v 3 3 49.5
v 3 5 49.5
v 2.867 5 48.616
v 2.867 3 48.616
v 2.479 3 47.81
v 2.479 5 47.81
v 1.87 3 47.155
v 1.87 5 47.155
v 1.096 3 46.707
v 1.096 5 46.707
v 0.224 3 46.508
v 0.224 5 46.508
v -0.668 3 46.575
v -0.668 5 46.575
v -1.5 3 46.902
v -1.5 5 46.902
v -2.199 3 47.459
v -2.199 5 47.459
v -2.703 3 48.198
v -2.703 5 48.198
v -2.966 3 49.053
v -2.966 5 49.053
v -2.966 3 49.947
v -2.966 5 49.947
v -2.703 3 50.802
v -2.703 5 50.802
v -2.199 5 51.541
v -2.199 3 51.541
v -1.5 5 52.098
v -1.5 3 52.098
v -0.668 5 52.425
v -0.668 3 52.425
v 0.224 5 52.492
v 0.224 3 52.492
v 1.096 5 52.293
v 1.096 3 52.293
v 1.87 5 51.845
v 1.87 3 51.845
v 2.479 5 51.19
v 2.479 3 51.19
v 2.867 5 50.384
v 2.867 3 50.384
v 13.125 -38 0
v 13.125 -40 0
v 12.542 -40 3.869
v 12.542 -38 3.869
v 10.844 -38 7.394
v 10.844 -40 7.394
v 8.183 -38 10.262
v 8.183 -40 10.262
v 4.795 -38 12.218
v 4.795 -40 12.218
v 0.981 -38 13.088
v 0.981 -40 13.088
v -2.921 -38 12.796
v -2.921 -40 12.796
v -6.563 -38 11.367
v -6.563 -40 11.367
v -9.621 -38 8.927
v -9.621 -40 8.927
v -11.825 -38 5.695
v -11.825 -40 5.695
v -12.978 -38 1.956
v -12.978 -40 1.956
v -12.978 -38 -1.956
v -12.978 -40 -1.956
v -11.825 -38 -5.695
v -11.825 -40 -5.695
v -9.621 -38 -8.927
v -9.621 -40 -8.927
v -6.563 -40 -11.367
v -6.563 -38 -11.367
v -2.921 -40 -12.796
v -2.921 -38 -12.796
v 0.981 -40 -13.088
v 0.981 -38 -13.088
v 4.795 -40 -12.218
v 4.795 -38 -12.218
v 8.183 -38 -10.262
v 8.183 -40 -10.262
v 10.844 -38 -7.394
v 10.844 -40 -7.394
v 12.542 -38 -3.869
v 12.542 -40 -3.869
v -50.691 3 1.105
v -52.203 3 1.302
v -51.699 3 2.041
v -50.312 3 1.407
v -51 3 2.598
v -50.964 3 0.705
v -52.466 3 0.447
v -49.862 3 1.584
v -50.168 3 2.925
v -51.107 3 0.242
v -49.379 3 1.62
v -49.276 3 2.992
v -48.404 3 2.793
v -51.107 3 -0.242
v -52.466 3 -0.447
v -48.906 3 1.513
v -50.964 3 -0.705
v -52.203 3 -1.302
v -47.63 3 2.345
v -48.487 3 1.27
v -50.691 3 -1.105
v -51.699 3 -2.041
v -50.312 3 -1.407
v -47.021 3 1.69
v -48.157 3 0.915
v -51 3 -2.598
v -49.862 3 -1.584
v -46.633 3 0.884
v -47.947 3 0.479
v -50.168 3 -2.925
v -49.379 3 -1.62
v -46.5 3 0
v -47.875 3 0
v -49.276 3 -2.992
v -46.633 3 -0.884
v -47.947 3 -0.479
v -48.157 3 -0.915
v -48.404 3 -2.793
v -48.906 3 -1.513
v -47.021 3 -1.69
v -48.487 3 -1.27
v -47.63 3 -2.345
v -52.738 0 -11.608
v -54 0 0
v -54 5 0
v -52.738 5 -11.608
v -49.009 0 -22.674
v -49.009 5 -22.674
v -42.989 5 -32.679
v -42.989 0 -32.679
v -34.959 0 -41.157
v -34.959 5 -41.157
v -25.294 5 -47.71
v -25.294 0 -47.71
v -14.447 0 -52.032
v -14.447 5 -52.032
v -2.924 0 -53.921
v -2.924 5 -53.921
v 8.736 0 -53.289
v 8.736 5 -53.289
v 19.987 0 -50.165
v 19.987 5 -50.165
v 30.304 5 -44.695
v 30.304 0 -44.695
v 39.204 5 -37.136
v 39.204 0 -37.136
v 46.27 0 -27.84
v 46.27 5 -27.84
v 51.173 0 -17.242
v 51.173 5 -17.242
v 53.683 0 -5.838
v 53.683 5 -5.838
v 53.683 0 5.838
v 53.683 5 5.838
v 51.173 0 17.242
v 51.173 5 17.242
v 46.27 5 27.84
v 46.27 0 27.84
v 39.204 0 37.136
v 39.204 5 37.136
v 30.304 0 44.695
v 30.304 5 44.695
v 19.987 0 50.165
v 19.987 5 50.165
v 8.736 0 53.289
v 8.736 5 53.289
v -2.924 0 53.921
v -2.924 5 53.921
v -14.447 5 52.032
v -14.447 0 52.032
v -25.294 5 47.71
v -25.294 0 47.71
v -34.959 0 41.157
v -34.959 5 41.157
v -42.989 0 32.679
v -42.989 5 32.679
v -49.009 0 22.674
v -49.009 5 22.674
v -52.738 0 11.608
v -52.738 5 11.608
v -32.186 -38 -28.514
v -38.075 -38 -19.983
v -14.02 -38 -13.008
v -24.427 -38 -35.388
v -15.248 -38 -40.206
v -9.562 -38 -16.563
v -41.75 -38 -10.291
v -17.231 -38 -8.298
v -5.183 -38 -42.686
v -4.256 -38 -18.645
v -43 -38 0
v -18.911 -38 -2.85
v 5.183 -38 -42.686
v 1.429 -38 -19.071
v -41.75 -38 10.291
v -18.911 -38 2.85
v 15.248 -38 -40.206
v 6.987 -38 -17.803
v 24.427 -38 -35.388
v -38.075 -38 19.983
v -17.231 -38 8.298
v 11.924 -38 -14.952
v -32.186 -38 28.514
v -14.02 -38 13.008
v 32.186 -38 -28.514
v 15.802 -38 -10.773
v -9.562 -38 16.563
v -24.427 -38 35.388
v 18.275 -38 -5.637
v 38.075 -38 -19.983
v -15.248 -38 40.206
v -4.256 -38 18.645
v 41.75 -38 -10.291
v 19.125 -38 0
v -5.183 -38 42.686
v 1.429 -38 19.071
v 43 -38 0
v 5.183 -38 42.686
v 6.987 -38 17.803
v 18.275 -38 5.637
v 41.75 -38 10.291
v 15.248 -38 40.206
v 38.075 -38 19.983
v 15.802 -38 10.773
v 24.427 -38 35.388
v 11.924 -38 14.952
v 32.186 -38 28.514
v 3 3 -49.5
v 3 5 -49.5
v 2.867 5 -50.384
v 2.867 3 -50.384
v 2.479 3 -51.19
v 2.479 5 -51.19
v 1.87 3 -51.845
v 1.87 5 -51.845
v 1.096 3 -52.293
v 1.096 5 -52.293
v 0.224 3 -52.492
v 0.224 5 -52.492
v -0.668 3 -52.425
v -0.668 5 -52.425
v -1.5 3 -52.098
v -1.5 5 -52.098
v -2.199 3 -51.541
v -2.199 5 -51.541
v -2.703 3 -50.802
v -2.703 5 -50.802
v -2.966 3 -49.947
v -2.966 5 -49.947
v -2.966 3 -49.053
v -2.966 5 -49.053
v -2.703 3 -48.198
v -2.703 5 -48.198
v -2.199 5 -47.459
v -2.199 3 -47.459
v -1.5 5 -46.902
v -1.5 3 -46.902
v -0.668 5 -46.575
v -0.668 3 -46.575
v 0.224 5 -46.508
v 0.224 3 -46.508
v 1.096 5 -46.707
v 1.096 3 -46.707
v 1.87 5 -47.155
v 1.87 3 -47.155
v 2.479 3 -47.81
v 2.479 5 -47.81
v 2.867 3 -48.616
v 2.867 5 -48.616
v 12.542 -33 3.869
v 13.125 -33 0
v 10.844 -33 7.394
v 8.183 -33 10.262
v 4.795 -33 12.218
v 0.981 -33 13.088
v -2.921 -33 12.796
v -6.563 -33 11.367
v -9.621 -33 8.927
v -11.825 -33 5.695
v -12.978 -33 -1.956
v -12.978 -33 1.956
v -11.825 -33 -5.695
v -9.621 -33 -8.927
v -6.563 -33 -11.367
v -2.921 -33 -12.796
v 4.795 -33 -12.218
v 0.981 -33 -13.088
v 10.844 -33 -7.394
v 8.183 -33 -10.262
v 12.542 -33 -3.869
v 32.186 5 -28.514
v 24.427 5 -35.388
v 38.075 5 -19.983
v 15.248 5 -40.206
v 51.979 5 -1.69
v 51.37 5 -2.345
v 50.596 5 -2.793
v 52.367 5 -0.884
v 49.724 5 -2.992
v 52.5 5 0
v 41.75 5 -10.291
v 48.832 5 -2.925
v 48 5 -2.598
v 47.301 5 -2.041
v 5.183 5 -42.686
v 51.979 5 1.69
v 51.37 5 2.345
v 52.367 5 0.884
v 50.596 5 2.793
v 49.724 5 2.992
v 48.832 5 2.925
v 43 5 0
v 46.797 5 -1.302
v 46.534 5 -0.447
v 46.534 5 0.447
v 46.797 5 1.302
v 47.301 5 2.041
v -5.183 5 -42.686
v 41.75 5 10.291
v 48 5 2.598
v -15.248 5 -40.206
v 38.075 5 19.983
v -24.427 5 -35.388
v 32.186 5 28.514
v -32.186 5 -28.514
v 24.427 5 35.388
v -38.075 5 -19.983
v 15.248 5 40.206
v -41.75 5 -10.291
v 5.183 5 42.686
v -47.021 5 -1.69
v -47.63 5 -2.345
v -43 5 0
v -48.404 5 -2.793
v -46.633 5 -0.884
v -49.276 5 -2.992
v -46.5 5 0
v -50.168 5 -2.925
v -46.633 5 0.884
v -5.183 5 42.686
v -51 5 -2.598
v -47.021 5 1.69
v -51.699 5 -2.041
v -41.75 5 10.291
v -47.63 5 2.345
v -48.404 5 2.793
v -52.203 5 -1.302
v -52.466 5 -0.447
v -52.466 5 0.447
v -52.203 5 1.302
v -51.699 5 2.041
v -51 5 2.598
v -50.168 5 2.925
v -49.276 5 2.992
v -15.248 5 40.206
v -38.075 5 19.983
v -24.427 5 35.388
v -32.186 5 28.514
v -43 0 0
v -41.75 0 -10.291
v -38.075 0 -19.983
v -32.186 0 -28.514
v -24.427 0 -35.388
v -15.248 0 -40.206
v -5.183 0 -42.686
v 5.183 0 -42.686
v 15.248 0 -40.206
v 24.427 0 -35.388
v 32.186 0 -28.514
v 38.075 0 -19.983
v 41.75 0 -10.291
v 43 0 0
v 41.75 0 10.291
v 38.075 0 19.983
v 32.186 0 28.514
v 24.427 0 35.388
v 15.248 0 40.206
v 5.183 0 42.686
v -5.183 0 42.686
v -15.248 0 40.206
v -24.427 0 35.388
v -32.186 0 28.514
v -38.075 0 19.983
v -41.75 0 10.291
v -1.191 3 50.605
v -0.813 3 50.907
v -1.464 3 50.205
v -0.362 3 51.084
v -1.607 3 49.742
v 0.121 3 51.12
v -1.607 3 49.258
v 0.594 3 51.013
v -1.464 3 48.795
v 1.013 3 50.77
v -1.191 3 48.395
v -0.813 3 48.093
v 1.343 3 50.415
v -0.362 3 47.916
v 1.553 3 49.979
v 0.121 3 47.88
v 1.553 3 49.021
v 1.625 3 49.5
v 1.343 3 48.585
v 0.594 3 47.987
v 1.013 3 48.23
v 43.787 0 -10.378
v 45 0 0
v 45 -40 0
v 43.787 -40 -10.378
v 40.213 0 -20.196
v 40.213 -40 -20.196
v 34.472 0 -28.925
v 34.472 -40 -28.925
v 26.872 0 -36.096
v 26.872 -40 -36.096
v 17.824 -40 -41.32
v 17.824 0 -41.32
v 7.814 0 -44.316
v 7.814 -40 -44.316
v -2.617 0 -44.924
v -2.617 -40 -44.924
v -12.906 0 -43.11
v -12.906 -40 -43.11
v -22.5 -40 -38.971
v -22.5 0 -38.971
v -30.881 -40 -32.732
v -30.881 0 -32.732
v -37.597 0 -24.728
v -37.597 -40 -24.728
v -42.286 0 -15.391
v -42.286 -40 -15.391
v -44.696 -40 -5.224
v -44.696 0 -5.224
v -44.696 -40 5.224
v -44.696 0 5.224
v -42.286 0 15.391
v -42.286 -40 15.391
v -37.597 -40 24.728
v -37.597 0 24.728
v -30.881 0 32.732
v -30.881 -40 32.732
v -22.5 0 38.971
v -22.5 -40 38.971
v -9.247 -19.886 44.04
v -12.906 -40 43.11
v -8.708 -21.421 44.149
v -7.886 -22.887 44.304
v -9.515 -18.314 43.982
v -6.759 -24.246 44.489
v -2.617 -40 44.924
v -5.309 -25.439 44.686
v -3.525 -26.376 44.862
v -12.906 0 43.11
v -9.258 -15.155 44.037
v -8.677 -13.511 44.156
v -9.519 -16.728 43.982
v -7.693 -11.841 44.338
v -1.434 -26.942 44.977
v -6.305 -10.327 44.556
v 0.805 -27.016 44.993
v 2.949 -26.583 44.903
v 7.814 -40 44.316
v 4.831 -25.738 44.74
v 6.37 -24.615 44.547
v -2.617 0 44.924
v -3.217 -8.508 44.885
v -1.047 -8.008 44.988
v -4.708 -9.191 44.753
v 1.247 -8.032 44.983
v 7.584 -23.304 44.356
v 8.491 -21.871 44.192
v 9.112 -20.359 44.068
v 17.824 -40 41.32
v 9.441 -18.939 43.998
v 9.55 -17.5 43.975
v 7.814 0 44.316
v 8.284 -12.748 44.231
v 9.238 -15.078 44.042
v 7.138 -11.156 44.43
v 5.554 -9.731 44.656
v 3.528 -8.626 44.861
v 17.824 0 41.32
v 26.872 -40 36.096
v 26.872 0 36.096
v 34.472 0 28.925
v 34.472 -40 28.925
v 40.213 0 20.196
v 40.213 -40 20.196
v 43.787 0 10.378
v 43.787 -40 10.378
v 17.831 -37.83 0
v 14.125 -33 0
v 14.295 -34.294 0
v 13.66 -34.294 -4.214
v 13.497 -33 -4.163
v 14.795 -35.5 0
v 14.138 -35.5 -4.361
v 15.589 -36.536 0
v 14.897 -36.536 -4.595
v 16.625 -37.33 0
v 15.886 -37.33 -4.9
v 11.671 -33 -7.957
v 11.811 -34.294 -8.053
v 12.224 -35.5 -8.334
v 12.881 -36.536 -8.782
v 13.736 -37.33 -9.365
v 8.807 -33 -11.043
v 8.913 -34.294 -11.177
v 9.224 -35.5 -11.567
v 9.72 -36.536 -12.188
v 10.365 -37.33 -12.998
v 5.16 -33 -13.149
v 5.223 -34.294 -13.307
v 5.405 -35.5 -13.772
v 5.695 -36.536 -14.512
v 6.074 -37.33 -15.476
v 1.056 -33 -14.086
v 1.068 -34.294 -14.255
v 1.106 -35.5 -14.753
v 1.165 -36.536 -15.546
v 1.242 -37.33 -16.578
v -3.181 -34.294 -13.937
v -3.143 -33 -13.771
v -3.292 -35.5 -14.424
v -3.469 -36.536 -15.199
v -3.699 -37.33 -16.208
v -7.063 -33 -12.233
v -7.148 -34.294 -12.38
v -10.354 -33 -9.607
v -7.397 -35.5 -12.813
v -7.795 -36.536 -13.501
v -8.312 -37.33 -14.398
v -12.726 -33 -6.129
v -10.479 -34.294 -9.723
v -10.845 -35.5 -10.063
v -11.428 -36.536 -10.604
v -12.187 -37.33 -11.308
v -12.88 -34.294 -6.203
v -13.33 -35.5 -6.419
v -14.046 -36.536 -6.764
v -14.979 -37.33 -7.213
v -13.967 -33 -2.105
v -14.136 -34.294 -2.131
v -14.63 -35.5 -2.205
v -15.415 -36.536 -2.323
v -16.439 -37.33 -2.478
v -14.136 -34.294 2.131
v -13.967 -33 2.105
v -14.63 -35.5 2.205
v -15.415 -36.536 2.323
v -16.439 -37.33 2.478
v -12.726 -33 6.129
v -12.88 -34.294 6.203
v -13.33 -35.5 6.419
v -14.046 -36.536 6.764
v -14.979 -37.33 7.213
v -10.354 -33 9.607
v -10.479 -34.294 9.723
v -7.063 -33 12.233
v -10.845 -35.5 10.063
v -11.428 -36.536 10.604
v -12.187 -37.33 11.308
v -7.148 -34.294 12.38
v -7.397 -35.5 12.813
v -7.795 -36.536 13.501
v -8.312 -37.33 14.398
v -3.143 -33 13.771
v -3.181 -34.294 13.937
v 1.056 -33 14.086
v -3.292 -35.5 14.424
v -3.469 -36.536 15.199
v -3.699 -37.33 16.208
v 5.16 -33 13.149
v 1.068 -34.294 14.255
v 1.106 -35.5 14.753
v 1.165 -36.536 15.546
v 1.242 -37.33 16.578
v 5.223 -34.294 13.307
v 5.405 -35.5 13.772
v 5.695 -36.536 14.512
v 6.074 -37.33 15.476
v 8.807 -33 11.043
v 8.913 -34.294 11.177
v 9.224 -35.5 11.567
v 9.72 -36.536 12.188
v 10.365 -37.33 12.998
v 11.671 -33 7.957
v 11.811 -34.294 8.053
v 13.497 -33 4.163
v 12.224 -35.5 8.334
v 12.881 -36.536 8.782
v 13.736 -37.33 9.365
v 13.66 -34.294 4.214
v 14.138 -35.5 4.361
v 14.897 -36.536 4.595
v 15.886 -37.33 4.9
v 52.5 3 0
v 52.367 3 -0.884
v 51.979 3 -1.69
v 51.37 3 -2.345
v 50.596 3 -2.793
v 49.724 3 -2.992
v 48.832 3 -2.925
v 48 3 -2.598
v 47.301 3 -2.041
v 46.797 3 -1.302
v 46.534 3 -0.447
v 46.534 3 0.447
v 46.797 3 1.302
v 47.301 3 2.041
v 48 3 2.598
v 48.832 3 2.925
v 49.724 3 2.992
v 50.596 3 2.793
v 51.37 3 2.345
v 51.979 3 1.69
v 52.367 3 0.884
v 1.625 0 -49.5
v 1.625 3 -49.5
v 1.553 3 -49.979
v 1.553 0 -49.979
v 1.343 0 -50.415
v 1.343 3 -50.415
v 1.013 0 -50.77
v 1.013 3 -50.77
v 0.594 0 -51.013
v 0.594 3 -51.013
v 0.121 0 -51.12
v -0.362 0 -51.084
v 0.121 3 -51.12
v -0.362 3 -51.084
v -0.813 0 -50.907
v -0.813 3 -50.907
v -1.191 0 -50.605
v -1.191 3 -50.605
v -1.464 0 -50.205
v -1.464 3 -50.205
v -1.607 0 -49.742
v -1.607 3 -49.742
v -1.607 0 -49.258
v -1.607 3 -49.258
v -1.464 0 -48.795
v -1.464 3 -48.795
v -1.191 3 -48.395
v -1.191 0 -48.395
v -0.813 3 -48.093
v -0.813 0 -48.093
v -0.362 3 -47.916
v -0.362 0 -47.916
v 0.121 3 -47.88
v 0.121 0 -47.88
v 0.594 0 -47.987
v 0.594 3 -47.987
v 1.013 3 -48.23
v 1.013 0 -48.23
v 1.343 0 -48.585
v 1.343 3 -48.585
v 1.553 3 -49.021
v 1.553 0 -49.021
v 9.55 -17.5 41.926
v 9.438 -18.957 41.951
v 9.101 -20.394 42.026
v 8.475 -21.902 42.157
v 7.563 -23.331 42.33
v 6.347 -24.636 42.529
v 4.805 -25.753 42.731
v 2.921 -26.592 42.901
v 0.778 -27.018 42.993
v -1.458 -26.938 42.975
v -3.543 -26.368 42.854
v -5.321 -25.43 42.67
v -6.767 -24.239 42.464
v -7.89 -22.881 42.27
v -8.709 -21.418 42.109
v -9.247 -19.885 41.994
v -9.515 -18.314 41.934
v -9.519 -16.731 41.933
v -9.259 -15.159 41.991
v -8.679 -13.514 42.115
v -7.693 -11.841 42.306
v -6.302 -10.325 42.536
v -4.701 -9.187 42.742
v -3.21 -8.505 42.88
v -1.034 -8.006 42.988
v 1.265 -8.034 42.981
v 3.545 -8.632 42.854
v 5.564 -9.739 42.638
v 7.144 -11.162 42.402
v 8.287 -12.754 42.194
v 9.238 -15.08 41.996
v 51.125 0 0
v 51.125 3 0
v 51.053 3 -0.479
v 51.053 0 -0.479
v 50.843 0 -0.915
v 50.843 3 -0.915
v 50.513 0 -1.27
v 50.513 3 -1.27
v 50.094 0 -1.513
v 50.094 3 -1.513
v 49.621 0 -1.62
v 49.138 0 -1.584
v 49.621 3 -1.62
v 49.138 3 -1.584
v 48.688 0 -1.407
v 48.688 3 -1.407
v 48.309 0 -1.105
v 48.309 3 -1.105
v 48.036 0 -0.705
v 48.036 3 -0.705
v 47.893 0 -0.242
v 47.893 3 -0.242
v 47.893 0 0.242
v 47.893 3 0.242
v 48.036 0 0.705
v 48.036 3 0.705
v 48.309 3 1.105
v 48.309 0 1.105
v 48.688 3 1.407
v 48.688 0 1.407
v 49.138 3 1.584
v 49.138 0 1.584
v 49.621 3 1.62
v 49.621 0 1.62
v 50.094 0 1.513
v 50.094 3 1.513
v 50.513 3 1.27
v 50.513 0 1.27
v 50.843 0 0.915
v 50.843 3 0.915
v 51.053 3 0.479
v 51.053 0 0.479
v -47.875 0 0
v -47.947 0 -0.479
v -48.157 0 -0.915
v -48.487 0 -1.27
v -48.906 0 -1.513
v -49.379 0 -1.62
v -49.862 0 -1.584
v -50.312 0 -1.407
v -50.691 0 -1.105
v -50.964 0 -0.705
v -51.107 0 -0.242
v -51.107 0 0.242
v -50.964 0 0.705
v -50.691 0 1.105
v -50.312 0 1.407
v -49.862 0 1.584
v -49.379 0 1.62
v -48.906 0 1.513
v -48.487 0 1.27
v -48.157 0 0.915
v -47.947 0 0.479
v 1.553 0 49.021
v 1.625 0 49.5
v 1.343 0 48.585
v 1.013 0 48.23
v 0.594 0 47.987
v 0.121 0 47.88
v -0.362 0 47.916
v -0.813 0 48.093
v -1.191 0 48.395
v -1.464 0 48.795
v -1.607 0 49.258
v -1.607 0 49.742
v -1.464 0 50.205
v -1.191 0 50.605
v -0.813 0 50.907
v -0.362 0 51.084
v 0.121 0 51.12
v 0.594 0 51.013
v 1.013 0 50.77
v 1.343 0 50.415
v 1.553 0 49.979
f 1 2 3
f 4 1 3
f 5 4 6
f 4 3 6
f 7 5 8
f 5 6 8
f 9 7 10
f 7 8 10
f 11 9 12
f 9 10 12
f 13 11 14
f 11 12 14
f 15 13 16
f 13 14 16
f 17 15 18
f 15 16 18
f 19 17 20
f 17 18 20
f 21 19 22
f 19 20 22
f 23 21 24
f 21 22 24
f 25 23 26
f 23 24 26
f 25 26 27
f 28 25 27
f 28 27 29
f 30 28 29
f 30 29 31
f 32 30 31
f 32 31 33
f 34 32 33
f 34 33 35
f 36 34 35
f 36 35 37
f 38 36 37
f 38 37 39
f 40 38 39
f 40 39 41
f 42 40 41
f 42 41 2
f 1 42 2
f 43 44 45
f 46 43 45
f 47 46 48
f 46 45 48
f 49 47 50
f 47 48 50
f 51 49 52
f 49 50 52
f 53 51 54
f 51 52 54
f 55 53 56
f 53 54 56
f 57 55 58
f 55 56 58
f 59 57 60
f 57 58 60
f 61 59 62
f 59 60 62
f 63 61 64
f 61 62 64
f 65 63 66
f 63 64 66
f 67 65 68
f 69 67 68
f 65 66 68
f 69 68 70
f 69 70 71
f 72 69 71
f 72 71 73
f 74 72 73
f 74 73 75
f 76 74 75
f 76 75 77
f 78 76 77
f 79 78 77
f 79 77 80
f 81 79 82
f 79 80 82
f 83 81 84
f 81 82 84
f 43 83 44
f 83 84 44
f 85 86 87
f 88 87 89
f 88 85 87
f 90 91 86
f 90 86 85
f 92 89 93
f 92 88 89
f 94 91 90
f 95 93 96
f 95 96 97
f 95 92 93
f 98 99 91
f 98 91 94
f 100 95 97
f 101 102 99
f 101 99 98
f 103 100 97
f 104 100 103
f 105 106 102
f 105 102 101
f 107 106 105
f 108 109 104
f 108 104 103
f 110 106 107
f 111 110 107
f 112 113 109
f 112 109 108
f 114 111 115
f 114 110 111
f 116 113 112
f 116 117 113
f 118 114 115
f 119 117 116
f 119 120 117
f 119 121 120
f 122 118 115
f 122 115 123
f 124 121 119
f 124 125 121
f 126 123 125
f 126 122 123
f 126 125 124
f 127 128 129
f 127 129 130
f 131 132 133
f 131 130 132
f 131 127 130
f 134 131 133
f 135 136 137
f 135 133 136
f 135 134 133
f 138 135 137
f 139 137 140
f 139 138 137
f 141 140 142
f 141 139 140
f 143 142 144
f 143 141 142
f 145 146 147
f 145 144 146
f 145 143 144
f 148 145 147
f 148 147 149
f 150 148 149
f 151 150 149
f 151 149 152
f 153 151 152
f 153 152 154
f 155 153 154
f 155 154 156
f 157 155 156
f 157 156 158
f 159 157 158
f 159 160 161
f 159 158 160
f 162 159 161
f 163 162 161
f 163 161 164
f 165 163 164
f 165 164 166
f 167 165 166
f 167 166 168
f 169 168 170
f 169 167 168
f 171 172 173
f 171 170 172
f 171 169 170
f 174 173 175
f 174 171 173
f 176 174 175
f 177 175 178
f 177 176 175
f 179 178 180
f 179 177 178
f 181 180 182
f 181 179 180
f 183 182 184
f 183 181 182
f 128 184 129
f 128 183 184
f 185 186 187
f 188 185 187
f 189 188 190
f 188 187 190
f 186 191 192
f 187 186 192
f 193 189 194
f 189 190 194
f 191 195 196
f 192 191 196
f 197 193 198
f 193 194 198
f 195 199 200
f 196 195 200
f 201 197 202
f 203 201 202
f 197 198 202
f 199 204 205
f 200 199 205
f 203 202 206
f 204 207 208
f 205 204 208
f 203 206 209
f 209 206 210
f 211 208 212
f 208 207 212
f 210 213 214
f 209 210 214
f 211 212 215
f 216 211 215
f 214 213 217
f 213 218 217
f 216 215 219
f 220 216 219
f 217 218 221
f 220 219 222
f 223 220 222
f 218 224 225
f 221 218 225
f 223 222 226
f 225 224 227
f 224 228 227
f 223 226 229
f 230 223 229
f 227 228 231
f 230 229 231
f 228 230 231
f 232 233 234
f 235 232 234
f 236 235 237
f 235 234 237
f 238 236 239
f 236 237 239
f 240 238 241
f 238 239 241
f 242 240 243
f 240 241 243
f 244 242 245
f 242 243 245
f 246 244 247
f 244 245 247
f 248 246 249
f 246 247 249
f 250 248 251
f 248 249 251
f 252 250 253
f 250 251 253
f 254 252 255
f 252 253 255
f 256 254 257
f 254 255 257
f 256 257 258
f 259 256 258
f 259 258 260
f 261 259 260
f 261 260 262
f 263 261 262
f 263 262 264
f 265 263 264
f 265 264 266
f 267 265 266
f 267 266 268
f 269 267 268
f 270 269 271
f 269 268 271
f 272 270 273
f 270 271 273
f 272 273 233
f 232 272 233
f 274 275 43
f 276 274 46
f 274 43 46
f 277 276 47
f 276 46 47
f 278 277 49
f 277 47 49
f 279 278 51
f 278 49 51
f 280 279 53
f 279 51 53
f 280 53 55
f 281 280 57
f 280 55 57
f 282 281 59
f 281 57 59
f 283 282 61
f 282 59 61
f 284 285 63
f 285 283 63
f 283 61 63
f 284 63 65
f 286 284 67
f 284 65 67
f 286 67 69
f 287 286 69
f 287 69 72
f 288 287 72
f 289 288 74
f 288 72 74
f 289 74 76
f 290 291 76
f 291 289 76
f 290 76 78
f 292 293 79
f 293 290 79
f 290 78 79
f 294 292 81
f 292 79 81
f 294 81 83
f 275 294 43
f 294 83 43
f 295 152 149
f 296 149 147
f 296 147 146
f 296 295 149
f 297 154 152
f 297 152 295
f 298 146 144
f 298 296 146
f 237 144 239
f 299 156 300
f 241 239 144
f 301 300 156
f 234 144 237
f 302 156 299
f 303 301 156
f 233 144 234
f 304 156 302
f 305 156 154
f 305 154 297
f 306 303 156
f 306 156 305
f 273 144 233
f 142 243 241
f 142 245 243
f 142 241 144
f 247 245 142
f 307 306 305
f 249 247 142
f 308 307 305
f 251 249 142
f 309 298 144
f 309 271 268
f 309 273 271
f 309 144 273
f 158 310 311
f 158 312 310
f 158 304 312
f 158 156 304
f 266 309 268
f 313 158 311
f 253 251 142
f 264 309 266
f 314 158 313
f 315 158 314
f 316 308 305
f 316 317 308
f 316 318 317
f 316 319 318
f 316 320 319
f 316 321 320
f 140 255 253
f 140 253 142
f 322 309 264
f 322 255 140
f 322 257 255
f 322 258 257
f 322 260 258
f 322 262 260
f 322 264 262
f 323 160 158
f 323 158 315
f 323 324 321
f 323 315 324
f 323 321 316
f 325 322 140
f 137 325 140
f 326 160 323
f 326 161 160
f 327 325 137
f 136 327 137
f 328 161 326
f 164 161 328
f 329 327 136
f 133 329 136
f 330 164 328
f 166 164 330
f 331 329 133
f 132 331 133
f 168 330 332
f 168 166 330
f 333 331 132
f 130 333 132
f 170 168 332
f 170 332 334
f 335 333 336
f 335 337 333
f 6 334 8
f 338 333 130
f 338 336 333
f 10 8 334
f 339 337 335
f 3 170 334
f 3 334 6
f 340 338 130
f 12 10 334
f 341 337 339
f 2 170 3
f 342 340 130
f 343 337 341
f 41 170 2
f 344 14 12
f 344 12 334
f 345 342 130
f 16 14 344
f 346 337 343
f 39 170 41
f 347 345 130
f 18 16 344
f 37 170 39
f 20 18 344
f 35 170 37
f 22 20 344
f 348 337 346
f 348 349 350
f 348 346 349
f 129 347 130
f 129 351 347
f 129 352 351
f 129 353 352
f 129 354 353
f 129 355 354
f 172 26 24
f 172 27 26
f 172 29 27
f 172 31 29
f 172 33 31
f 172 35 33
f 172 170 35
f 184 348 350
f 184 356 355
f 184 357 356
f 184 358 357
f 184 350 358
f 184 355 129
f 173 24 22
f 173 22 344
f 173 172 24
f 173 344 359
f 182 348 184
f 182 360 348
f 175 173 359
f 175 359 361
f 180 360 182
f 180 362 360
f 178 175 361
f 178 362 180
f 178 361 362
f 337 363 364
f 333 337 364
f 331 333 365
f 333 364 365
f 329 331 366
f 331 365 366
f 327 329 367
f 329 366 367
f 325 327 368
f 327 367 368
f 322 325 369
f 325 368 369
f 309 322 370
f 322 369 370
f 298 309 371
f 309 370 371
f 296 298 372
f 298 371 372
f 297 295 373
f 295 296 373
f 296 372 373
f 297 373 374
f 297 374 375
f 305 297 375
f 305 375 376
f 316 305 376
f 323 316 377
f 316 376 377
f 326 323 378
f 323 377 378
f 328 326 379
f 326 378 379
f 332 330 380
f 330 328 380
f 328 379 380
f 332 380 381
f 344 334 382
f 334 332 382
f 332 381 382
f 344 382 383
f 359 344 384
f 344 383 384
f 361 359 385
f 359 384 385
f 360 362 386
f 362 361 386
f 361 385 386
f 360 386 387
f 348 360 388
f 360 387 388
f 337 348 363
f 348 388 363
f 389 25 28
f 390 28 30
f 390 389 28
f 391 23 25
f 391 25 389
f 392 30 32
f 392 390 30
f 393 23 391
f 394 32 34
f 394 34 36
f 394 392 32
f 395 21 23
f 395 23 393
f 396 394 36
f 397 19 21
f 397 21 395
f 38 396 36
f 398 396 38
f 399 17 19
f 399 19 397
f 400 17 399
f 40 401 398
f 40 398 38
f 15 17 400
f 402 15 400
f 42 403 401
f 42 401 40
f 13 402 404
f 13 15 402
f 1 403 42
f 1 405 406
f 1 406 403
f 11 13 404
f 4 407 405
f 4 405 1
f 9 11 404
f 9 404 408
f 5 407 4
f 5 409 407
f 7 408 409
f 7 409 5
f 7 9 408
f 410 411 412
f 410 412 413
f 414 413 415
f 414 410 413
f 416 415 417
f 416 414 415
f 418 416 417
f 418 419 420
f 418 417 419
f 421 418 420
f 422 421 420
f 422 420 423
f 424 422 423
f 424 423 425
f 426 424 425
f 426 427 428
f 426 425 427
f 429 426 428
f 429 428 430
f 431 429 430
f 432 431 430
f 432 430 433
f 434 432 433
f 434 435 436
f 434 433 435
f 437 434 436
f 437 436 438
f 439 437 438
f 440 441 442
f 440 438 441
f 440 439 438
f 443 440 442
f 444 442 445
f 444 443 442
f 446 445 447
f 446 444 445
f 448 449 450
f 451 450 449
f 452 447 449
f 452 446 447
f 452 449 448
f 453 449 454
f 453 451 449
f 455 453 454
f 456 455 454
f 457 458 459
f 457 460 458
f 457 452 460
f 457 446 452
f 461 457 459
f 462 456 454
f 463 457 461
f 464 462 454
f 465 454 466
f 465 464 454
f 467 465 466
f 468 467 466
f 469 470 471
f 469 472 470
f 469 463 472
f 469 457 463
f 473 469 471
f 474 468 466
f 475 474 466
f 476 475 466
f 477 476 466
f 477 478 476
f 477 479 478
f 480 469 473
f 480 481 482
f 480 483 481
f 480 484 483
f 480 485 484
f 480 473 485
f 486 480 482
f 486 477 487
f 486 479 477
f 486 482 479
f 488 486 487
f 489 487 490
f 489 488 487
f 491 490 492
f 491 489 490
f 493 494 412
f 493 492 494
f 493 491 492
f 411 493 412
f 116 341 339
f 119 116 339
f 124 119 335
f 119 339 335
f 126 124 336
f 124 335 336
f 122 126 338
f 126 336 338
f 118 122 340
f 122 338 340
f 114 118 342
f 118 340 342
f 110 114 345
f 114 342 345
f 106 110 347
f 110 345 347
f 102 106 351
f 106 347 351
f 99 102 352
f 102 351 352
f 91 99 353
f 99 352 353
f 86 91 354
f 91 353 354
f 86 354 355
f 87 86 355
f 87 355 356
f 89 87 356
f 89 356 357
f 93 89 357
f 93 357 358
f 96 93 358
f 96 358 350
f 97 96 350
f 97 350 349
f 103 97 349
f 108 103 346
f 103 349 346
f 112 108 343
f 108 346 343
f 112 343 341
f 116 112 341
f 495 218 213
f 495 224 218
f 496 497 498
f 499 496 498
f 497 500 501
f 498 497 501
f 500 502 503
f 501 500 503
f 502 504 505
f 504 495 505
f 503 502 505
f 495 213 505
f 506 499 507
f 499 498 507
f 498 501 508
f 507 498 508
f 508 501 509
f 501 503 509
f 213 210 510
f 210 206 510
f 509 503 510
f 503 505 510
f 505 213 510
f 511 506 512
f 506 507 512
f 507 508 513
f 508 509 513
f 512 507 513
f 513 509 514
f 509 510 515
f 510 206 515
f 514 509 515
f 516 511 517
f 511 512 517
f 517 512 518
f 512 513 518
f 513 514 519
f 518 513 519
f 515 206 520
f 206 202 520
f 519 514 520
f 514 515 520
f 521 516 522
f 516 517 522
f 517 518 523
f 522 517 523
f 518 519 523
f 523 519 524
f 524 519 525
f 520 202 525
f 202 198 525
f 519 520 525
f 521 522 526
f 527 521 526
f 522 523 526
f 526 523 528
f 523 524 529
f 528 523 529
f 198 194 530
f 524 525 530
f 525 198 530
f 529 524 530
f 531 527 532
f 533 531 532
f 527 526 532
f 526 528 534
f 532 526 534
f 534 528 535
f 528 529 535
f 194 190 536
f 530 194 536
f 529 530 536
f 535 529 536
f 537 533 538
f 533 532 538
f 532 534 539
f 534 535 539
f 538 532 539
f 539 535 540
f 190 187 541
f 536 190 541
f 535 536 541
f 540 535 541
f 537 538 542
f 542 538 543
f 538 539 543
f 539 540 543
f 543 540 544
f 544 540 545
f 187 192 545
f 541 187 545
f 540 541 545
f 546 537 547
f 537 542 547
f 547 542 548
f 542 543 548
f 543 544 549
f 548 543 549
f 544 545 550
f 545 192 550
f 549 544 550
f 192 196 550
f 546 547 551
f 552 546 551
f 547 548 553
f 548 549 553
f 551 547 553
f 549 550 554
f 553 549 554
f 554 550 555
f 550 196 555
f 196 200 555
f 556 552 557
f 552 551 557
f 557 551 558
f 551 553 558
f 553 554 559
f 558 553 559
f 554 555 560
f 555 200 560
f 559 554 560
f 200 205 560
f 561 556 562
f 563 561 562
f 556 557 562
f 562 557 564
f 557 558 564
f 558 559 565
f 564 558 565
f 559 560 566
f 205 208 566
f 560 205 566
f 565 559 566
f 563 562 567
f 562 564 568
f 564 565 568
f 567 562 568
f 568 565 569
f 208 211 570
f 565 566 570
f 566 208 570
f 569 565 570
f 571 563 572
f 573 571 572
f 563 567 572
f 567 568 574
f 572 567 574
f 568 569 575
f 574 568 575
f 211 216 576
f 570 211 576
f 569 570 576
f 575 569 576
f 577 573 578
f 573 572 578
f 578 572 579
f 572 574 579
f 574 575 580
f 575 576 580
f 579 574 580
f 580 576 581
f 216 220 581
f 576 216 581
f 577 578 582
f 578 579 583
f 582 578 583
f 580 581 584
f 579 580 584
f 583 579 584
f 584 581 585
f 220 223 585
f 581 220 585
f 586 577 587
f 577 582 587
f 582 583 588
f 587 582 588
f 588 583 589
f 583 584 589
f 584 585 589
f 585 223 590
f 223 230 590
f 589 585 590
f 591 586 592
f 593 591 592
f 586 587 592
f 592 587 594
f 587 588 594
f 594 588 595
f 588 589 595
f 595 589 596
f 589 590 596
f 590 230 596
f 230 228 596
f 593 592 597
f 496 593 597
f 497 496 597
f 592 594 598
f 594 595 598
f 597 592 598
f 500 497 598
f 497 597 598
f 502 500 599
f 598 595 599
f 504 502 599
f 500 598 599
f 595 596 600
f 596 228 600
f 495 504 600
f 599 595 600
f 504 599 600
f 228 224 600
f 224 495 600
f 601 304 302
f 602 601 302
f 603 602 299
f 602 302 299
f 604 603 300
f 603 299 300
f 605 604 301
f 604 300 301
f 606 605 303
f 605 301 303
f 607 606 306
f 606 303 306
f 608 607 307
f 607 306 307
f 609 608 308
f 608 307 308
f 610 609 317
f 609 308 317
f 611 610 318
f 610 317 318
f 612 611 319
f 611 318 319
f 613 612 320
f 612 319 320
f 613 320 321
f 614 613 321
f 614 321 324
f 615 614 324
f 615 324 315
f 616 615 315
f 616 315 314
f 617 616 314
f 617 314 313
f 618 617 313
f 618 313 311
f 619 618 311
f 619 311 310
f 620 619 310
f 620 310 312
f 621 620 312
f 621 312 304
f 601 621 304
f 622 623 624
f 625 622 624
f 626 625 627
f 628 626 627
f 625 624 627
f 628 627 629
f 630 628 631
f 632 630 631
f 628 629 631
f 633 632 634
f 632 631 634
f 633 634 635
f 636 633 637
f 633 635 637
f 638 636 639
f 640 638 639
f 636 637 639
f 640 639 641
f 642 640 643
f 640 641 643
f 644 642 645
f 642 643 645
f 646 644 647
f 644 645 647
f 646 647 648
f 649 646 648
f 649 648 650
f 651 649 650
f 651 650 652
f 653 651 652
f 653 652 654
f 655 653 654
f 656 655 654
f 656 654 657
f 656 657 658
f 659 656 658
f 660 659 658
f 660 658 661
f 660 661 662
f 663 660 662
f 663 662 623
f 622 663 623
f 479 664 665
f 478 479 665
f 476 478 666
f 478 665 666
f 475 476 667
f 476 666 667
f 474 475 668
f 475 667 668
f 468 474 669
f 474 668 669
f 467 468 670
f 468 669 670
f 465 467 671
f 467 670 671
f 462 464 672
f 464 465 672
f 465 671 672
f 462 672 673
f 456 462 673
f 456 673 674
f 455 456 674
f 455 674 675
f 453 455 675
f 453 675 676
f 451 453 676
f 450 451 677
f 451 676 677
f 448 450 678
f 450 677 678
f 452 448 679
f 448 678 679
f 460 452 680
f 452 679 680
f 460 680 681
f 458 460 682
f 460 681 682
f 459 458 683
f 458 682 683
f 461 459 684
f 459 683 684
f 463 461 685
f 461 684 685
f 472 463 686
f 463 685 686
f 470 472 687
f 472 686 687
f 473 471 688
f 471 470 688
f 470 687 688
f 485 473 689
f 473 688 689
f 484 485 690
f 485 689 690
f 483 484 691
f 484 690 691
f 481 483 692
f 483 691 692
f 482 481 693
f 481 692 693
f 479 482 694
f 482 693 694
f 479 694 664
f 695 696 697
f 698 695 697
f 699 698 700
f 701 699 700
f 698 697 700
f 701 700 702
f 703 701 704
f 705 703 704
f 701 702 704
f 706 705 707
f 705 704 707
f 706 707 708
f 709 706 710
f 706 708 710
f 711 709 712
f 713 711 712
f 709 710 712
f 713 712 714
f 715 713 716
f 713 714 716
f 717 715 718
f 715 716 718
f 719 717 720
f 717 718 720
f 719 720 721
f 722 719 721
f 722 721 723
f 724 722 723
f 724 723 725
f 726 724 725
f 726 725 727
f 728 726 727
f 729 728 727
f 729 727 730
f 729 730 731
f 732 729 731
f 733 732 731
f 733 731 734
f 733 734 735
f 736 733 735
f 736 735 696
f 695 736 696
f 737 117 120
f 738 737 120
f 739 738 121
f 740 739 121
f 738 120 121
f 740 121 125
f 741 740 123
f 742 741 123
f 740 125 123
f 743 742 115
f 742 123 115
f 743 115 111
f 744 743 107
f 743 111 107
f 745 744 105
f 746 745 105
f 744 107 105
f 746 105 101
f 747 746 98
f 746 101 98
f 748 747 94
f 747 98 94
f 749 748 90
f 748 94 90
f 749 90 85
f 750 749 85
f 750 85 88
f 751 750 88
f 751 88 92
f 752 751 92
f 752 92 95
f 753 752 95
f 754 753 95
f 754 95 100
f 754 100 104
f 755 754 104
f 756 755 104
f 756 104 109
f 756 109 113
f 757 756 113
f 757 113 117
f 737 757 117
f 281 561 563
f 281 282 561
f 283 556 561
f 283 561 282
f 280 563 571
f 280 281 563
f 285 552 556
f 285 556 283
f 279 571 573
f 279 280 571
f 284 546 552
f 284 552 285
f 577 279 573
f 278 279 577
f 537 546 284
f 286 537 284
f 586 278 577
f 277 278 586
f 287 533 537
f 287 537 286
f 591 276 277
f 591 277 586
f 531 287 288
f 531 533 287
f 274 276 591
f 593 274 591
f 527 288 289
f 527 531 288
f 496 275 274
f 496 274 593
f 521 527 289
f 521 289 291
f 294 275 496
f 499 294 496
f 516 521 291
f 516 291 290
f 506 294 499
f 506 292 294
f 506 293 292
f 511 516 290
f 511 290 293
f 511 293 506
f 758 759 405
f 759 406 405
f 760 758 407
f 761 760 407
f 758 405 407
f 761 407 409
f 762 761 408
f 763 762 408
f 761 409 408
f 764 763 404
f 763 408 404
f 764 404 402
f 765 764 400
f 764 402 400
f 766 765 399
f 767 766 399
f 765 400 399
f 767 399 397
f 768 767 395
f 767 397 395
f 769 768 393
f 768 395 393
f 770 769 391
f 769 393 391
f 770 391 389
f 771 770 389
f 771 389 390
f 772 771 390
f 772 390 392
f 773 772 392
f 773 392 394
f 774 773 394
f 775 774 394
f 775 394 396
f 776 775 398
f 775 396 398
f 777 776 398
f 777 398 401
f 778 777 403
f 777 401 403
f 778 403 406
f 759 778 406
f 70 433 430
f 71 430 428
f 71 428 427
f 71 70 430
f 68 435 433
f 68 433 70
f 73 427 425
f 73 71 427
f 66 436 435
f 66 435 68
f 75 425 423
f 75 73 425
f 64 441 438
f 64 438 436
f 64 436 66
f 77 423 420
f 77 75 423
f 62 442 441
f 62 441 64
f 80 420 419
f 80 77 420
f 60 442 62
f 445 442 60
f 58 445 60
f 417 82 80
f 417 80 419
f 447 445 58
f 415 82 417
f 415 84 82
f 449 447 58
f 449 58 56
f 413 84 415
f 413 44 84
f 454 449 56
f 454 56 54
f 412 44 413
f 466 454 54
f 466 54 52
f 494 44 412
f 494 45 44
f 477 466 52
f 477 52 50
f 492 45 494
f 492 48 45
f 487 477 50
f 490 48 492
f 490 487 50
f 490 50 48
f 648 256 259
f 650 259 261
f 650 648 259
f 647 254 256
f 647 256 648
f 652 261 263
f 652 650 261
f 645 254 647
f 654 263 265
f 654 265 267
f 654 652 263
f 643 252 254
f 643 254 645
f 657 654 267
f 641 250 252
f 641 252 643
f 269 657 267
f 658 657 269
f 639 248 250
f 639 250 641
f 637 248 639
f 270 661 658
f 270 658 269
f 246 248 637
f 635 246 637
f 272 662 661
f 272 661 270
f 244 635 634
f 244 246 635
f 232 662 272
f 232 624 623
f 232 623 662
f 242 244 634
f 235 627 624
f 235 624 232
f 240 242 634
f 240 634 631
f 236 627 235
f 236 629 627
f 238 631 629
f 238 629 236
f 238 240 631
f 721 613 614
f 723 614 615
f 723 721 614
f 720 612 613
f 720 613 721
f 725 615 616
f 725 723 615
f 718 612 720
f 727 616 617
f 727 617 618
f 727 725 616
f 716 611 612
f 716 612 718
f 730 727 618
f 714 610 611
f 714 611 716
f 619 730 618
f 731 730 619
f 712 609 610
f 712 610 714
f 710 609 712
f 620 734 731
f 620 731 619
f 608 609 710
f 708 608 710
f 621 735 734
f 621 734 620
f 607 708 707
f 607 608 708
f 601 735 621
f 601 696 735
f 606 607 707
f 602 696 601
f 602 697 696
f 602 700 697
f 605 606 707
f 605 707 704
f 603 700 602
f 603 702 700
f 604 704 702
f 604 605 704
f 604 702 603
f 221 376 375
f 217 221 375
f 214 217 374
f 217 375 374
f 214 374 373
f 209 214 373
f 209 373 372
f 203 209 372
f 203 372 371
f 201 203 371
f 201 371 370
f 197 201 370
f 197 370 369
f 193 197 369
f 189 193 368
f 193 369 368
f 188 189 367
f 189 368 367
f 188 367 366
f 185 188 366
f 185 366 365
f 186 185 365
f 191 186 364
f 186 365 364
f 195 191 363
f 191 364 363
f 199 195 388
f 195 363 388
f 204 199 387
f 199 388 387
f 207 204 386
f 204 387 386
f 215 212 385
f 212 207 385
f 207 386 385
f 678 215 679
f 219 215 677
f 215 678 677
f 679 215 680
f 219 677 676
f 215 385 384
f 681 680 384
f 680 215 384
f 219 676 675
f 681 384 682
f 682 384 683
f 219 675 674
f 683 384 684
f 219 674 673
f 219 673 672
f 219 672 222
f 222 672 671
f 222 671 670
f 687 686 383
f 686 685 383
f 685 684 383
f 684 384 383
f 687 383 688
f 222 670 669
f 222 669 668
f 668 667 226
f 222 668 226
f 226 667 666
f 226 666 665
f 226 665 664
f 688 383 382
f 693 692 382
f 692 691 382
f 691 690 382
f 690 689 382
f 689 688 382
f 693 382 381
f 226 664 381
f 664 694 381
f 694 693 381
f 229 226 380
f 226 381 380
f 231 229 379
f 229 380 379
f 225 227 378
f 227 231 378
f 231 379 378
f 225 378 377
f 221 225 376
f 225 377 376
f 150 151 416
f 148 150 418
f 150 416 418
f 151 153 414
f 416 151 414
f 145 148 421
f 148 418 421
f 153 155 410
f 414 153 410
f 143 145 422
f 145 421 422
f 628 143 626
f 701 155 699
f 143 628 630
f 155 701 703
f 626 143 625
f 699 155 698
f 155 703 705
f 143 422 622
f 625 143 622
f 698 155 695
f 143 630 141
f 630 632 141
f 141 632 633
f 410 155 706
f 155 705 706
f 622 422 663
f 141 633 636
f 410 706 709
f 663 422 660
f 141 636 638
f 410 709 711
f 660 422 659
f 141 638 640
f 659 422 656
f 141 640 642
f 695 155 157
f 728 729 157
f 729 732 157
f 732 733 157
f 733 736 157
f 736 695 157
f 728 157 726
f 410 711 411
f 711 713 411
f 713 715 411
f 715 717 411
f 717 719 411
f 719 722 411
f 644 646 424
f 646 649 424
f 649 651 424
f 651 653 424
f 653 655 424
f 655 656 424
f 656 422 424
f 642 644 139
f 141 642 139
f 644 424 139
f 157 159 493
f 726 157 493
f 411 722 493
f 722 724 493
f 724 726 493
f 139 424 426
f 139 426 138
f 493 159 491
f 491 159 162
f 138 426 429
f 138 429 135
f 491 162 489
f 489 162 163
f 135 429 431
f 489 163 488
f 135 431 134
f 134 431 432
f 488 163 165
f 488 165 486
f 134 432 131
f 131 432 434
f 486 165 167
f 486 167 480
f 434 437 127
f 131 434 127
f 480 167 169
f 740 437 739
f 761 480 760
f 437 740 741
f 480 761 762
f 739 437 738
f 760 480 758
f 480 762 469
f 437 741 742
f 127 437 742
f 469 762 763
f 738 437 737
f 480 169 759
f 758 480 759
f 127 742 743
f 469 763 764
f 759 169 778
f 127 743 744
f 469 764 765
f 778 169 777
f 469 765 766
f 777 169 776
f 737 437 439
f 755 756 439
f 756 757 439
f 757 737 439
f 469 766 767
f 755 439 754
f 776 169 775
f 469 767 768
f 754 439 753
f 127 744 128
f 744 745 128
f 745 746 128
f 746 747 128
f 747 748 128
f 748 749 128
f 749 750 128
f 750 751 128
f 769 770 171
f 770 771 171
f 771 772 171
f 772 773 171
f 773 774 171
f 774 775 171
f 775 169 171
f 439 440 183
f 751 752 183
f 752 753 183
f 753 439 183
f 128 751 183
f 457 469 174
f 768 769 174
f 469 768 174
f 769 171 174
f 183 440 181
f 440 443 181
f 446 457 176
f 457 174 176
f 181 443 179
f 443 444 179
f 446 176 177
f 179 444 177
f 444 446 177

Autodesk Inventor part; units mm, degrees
ref_plane "YZ Plane" through (0, 0, 0) normal (1, 0, 0) x (0, 1, 0)
ref_plane "XZ Plane" through (0, 0, 0) normal (0, 1, 0) x (-1, 0, 0)
ref_plane "XY Plane" through (0, 0, 0) normal (0, 0, 1) x (1, 0, 0)
sketch "Boceto1" plane through (0, 0, 0) normal (0, 1, 0) x (-1, 0, 0)
  circle A0 centre (0, 0) radius 45
  circle A1 centre (0, 0) radius 54
  circle A2 centre (0, 0) radius 43
  dimension "d0" = 90
  dimension "d1" = 9
  dimension "d8" = 2
extrude "Extrusión1" add sketch "Boceto1" along normal blind 5 contours A0 | A1
sketch "Boceto2" plane through (0, 0, 0) normal (0, -1, 0) x (1, 0, 0)
  circle A0 centre (0, 0) radius 45
  circle A1 centre (0, 0) radius 43
  dimension "d7" = 2
extrude "Extrusión2" add sketch "Boceto2" along normal blind 38
sketch "Boceto3" plane through (0, -38, 0) normal (0, -1, 0) x (1, 0, 0)
  circle A0 centre (0, 0) radius 45
extrude "Extrusión3" add sketch "Boceto3" along normal blind 2
sketch "Boceto4" plane through (0, 5, 0) normal (0, 1, 0) x (1, 0, 0)
  circle A0 centre (0, 0) radius 45 construction
  circle A1 centre (0, 0) radius 49.5 construction
  circle A2 centre (-49.5, 0) radius 1.625
  circle A3 centre (0, 49.5) radius 1.625
  circle A4 centre (49.5, 0) radius 1.625
  circle A5 centre (0, -49.5) radius 1.625
  dimension "d11" = 4.5
  dimension "d12" = 90
  dimension "d13" = 3.25
  dimension "d14" = 3.25
  dimension "d15" = 3.25
  dimension "d16" = 3.25
extrude "Extrusión4" cut sketch "Boceto4" against normal blind 10
sketch "Boceto5" plane through (0, 5, 0) normal (0, 1, 0) x (1, 0, 0)
  circle A0 centre (0, 49.5) radius 1.625 projected
  circle A1 centre (0, 49.5) radius 3
  circle A2 centre (49.5, 0) radius 1.625 projected
  circle A3 centre (49.5, 0) radius 3
  circle A4 centre (0, -49.5) radius 1.625 projected
  circle A5 centre (0, -49.5) radius 3
  circle A6 centre (-49.5, 0) radius 1.625 projected
  circle A7 centre (-49.5, 0) radius 3
  point P0 (0, 0)
  dimension "d19" = 6
  dimension "d20" = 6
  dimension "d21" = 6
  dimension "d22" = 6
extrude "Extrusión5" cut sketch "Boceto5" against normal blind 2 contours A0 | A1 | A2 | A3 | A4 | A5 | A6 | A7
sketch "Boceto6" plane through (0, -40, 0) normal (0, -1, 0) x (1, 0, 0)
  circle A0 centre (0, 0) radius 13.125
  dimension "d33" = 26.25
extrude "Extrusión6" cut sketch "Boceto6" against normal blind 5
sketch "Boceto7" plane through (0, -38, 0) normal (0, 1, 0) x (1, 0, 0)
  circle A0 centre (0, 0) radius 13.125
  circle A1 centre (0, 0) radius 14.125
  dimension "d36" = 1
  dimension "d37" = 26.25
extrude "Extrusión7" add sketch "Boceto7" along normal blind 5
fillet "Empalme de cara1" radius 5 1 edges at (-14.125, -38, 0)
sketch "Boceto8" plane through (0, -40, 0) normal (0, -1, 0) x (1, 0, 0)
  line L0 (-102.7174, -0.1449) -> (97.2826, -0.1449)
  line L1 (97.2826, -0.1449) -> (97.2826, -10.1449)
  line L2 (97.2826, -10.1449) -> (-102.7174, -10.1449)
  line L3 (-102.7174, -10.1449) -> (-102.7174, -0.1449)
  point P0 (0, 0)
  dimension "d43" = 200
  dimension "d44" = 10
extrude "Extrusión8" add sketch "Boceto8" along normal blind 10
sketch "Boceto10" plane through (-102.7174, -40, -0.1449) normal (0, 0, 1) x (1, 0, 0)
  line L0 (57.7176, 0) -> (0, 0) projected
  line L1 (0, 0) -> (212.0347, 0)
  line L2 (156.7174, 45) -> (48.7174, 45) projected
  line L3 (48.7174, 45) -> (156.7174, 45)
  line L4 (102.7174, 45) -> (102.7174, 0) construction
  circle A0 centre (102.7174, 22.5) radius 9.55
  point P0 (102.7174, 40)
  dimension "d45" = 19.1
extrude "Extrusión9" cut sketch "Boceto10" along normal blind 70
sketch "Boceto11" plane through (0, -50, 0) normal (0, -1, 0) x (1, 0, 0)
  line L0 (-102.7174, -0.1449) -> (-102.7174, -10.1449) projected
  line L1 (-102.7174, -10.1449) -> (97.2826, -10.1449) projected
  line L2 (-102.7174, -0.1449) -> (97.2826, -0.1449)
  line L3 (97.2826, -0.1449) -> (97.2826, -10.1449)
  line L4 (97.2826, -10.1449) -> (-102.7174, -10.1449)
  line L5 (-102.7174, -10.1449) -> (-102.7174, -0.1449)
  point P0 (0, 0)
extrude "Extrusión10" cut sketch "Boceto11" against normal blind 10
